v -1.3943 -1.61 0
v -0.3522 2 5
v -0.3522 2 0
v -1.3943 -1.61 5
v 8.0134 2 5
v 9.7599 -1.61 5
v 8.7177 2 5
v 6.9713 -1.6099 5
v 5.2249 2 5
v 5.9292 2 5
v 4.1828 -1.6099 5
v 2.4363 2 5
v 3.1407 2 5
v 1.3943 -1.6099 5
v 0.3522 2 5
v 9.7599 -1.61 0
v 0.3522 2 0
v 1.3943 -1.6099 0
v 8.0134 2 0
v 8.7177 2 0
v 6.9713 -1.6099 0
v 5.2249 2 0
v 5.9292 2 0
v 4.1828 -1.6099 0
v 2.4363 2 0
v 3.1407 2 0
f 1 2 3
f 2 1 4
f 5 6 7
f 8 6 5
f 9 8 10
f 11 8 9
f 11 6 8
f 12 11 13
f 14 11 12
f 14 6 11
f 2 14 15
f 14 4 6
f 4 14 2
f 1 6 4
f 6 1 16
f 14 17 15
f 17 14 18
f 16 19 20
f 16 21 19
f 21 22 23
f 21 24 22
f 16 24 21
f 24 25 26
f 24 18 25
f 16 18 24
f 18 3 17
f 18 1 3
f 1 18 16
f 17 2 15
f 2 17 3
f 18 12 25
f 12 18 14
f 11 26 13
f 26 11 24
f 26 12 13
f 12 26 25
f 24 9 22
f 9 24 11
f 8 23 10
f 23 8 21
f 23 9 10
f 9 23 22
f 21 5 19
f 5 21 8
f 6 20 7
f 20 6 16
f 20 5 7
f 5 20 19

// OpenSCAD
// file: measures.scad
// millimeters

$fn = 100;
nothing = 0.05;

material_thickness = 0.8;

// lid
lid_length = 13;
lid_center_diameter = 10;
lid_appendix_diameter = 7.5;
lid_height = 1.75;
lid_center_radius = lid_center_diameter/2;
lid_appendix_radius = lid_appendix_diameter/2;
lid_appendix_excentricity = lid_length - lid_center_diameter/2 - lid_appendix_diameter/2;

// lid closure
lid_closure_outer_diameter = 7;
lid_closure_inner_diameter = 5;
lid_closure_height = 5 - lid_height;

// lid-body joint
joint_length = 8.5;
joint_width = 3;

// body
body_height = 31;

body_top_outer_diameter = 9;
body_top_inner_diameter = 7;
body_top_height = 1.5;
body_top_outer_radius = body_top_outer_diameter/2;
body_top_inner_radius = body_top_inner_diameter/2;

body_center_diameter = 8;
body_center_height = 16;
body_center_radius = body_center_diameter/2;

body_cone_upper_diameter = body_center_diameter;
body_cone_lower_diameter = 4;
body_cone_height = 11.5;
body_cone_upper_radius = body_cone_upper_diameter/2;
body_cone_lower_radius = body_cone_lower_diameter/2;

// half sphere
body_bottom_radius = 2;

//lid joint
joint_x = 3.5;
joint_y = 3.2;
joint_z = 2.5;
// main file
include <measures.scad>;


//color("green")
  //  translate([-30, 0, 0])
    //    linear_extrude(height = 15, scale = 0.5,1,1)
      //      square([20, 10], center = true);

nothing=0.001;
rip_length=1.61;   
rip_height=5;

module single_rip()
{
scale([1,2,1])
difference(){            
color("purple")
    translate([0, 0, 0])
    rotate([0,0,90])
            cylinder(r=rip_length, h=rip_height, $fn=3);
    translate([
-1/2*rip_length,
001,
000,
])
    scale([1,1,1])
    cube([rip_length,rip_length,rip_height+nothing]);

}
}
single_rip();
translate([1.732*rip_length,0,0])
single_rip();
translate([2*1.732*rip_length,0,0])
single_rip();
translate([3*1.732*rip_length,0,0])
single_rip();
            
